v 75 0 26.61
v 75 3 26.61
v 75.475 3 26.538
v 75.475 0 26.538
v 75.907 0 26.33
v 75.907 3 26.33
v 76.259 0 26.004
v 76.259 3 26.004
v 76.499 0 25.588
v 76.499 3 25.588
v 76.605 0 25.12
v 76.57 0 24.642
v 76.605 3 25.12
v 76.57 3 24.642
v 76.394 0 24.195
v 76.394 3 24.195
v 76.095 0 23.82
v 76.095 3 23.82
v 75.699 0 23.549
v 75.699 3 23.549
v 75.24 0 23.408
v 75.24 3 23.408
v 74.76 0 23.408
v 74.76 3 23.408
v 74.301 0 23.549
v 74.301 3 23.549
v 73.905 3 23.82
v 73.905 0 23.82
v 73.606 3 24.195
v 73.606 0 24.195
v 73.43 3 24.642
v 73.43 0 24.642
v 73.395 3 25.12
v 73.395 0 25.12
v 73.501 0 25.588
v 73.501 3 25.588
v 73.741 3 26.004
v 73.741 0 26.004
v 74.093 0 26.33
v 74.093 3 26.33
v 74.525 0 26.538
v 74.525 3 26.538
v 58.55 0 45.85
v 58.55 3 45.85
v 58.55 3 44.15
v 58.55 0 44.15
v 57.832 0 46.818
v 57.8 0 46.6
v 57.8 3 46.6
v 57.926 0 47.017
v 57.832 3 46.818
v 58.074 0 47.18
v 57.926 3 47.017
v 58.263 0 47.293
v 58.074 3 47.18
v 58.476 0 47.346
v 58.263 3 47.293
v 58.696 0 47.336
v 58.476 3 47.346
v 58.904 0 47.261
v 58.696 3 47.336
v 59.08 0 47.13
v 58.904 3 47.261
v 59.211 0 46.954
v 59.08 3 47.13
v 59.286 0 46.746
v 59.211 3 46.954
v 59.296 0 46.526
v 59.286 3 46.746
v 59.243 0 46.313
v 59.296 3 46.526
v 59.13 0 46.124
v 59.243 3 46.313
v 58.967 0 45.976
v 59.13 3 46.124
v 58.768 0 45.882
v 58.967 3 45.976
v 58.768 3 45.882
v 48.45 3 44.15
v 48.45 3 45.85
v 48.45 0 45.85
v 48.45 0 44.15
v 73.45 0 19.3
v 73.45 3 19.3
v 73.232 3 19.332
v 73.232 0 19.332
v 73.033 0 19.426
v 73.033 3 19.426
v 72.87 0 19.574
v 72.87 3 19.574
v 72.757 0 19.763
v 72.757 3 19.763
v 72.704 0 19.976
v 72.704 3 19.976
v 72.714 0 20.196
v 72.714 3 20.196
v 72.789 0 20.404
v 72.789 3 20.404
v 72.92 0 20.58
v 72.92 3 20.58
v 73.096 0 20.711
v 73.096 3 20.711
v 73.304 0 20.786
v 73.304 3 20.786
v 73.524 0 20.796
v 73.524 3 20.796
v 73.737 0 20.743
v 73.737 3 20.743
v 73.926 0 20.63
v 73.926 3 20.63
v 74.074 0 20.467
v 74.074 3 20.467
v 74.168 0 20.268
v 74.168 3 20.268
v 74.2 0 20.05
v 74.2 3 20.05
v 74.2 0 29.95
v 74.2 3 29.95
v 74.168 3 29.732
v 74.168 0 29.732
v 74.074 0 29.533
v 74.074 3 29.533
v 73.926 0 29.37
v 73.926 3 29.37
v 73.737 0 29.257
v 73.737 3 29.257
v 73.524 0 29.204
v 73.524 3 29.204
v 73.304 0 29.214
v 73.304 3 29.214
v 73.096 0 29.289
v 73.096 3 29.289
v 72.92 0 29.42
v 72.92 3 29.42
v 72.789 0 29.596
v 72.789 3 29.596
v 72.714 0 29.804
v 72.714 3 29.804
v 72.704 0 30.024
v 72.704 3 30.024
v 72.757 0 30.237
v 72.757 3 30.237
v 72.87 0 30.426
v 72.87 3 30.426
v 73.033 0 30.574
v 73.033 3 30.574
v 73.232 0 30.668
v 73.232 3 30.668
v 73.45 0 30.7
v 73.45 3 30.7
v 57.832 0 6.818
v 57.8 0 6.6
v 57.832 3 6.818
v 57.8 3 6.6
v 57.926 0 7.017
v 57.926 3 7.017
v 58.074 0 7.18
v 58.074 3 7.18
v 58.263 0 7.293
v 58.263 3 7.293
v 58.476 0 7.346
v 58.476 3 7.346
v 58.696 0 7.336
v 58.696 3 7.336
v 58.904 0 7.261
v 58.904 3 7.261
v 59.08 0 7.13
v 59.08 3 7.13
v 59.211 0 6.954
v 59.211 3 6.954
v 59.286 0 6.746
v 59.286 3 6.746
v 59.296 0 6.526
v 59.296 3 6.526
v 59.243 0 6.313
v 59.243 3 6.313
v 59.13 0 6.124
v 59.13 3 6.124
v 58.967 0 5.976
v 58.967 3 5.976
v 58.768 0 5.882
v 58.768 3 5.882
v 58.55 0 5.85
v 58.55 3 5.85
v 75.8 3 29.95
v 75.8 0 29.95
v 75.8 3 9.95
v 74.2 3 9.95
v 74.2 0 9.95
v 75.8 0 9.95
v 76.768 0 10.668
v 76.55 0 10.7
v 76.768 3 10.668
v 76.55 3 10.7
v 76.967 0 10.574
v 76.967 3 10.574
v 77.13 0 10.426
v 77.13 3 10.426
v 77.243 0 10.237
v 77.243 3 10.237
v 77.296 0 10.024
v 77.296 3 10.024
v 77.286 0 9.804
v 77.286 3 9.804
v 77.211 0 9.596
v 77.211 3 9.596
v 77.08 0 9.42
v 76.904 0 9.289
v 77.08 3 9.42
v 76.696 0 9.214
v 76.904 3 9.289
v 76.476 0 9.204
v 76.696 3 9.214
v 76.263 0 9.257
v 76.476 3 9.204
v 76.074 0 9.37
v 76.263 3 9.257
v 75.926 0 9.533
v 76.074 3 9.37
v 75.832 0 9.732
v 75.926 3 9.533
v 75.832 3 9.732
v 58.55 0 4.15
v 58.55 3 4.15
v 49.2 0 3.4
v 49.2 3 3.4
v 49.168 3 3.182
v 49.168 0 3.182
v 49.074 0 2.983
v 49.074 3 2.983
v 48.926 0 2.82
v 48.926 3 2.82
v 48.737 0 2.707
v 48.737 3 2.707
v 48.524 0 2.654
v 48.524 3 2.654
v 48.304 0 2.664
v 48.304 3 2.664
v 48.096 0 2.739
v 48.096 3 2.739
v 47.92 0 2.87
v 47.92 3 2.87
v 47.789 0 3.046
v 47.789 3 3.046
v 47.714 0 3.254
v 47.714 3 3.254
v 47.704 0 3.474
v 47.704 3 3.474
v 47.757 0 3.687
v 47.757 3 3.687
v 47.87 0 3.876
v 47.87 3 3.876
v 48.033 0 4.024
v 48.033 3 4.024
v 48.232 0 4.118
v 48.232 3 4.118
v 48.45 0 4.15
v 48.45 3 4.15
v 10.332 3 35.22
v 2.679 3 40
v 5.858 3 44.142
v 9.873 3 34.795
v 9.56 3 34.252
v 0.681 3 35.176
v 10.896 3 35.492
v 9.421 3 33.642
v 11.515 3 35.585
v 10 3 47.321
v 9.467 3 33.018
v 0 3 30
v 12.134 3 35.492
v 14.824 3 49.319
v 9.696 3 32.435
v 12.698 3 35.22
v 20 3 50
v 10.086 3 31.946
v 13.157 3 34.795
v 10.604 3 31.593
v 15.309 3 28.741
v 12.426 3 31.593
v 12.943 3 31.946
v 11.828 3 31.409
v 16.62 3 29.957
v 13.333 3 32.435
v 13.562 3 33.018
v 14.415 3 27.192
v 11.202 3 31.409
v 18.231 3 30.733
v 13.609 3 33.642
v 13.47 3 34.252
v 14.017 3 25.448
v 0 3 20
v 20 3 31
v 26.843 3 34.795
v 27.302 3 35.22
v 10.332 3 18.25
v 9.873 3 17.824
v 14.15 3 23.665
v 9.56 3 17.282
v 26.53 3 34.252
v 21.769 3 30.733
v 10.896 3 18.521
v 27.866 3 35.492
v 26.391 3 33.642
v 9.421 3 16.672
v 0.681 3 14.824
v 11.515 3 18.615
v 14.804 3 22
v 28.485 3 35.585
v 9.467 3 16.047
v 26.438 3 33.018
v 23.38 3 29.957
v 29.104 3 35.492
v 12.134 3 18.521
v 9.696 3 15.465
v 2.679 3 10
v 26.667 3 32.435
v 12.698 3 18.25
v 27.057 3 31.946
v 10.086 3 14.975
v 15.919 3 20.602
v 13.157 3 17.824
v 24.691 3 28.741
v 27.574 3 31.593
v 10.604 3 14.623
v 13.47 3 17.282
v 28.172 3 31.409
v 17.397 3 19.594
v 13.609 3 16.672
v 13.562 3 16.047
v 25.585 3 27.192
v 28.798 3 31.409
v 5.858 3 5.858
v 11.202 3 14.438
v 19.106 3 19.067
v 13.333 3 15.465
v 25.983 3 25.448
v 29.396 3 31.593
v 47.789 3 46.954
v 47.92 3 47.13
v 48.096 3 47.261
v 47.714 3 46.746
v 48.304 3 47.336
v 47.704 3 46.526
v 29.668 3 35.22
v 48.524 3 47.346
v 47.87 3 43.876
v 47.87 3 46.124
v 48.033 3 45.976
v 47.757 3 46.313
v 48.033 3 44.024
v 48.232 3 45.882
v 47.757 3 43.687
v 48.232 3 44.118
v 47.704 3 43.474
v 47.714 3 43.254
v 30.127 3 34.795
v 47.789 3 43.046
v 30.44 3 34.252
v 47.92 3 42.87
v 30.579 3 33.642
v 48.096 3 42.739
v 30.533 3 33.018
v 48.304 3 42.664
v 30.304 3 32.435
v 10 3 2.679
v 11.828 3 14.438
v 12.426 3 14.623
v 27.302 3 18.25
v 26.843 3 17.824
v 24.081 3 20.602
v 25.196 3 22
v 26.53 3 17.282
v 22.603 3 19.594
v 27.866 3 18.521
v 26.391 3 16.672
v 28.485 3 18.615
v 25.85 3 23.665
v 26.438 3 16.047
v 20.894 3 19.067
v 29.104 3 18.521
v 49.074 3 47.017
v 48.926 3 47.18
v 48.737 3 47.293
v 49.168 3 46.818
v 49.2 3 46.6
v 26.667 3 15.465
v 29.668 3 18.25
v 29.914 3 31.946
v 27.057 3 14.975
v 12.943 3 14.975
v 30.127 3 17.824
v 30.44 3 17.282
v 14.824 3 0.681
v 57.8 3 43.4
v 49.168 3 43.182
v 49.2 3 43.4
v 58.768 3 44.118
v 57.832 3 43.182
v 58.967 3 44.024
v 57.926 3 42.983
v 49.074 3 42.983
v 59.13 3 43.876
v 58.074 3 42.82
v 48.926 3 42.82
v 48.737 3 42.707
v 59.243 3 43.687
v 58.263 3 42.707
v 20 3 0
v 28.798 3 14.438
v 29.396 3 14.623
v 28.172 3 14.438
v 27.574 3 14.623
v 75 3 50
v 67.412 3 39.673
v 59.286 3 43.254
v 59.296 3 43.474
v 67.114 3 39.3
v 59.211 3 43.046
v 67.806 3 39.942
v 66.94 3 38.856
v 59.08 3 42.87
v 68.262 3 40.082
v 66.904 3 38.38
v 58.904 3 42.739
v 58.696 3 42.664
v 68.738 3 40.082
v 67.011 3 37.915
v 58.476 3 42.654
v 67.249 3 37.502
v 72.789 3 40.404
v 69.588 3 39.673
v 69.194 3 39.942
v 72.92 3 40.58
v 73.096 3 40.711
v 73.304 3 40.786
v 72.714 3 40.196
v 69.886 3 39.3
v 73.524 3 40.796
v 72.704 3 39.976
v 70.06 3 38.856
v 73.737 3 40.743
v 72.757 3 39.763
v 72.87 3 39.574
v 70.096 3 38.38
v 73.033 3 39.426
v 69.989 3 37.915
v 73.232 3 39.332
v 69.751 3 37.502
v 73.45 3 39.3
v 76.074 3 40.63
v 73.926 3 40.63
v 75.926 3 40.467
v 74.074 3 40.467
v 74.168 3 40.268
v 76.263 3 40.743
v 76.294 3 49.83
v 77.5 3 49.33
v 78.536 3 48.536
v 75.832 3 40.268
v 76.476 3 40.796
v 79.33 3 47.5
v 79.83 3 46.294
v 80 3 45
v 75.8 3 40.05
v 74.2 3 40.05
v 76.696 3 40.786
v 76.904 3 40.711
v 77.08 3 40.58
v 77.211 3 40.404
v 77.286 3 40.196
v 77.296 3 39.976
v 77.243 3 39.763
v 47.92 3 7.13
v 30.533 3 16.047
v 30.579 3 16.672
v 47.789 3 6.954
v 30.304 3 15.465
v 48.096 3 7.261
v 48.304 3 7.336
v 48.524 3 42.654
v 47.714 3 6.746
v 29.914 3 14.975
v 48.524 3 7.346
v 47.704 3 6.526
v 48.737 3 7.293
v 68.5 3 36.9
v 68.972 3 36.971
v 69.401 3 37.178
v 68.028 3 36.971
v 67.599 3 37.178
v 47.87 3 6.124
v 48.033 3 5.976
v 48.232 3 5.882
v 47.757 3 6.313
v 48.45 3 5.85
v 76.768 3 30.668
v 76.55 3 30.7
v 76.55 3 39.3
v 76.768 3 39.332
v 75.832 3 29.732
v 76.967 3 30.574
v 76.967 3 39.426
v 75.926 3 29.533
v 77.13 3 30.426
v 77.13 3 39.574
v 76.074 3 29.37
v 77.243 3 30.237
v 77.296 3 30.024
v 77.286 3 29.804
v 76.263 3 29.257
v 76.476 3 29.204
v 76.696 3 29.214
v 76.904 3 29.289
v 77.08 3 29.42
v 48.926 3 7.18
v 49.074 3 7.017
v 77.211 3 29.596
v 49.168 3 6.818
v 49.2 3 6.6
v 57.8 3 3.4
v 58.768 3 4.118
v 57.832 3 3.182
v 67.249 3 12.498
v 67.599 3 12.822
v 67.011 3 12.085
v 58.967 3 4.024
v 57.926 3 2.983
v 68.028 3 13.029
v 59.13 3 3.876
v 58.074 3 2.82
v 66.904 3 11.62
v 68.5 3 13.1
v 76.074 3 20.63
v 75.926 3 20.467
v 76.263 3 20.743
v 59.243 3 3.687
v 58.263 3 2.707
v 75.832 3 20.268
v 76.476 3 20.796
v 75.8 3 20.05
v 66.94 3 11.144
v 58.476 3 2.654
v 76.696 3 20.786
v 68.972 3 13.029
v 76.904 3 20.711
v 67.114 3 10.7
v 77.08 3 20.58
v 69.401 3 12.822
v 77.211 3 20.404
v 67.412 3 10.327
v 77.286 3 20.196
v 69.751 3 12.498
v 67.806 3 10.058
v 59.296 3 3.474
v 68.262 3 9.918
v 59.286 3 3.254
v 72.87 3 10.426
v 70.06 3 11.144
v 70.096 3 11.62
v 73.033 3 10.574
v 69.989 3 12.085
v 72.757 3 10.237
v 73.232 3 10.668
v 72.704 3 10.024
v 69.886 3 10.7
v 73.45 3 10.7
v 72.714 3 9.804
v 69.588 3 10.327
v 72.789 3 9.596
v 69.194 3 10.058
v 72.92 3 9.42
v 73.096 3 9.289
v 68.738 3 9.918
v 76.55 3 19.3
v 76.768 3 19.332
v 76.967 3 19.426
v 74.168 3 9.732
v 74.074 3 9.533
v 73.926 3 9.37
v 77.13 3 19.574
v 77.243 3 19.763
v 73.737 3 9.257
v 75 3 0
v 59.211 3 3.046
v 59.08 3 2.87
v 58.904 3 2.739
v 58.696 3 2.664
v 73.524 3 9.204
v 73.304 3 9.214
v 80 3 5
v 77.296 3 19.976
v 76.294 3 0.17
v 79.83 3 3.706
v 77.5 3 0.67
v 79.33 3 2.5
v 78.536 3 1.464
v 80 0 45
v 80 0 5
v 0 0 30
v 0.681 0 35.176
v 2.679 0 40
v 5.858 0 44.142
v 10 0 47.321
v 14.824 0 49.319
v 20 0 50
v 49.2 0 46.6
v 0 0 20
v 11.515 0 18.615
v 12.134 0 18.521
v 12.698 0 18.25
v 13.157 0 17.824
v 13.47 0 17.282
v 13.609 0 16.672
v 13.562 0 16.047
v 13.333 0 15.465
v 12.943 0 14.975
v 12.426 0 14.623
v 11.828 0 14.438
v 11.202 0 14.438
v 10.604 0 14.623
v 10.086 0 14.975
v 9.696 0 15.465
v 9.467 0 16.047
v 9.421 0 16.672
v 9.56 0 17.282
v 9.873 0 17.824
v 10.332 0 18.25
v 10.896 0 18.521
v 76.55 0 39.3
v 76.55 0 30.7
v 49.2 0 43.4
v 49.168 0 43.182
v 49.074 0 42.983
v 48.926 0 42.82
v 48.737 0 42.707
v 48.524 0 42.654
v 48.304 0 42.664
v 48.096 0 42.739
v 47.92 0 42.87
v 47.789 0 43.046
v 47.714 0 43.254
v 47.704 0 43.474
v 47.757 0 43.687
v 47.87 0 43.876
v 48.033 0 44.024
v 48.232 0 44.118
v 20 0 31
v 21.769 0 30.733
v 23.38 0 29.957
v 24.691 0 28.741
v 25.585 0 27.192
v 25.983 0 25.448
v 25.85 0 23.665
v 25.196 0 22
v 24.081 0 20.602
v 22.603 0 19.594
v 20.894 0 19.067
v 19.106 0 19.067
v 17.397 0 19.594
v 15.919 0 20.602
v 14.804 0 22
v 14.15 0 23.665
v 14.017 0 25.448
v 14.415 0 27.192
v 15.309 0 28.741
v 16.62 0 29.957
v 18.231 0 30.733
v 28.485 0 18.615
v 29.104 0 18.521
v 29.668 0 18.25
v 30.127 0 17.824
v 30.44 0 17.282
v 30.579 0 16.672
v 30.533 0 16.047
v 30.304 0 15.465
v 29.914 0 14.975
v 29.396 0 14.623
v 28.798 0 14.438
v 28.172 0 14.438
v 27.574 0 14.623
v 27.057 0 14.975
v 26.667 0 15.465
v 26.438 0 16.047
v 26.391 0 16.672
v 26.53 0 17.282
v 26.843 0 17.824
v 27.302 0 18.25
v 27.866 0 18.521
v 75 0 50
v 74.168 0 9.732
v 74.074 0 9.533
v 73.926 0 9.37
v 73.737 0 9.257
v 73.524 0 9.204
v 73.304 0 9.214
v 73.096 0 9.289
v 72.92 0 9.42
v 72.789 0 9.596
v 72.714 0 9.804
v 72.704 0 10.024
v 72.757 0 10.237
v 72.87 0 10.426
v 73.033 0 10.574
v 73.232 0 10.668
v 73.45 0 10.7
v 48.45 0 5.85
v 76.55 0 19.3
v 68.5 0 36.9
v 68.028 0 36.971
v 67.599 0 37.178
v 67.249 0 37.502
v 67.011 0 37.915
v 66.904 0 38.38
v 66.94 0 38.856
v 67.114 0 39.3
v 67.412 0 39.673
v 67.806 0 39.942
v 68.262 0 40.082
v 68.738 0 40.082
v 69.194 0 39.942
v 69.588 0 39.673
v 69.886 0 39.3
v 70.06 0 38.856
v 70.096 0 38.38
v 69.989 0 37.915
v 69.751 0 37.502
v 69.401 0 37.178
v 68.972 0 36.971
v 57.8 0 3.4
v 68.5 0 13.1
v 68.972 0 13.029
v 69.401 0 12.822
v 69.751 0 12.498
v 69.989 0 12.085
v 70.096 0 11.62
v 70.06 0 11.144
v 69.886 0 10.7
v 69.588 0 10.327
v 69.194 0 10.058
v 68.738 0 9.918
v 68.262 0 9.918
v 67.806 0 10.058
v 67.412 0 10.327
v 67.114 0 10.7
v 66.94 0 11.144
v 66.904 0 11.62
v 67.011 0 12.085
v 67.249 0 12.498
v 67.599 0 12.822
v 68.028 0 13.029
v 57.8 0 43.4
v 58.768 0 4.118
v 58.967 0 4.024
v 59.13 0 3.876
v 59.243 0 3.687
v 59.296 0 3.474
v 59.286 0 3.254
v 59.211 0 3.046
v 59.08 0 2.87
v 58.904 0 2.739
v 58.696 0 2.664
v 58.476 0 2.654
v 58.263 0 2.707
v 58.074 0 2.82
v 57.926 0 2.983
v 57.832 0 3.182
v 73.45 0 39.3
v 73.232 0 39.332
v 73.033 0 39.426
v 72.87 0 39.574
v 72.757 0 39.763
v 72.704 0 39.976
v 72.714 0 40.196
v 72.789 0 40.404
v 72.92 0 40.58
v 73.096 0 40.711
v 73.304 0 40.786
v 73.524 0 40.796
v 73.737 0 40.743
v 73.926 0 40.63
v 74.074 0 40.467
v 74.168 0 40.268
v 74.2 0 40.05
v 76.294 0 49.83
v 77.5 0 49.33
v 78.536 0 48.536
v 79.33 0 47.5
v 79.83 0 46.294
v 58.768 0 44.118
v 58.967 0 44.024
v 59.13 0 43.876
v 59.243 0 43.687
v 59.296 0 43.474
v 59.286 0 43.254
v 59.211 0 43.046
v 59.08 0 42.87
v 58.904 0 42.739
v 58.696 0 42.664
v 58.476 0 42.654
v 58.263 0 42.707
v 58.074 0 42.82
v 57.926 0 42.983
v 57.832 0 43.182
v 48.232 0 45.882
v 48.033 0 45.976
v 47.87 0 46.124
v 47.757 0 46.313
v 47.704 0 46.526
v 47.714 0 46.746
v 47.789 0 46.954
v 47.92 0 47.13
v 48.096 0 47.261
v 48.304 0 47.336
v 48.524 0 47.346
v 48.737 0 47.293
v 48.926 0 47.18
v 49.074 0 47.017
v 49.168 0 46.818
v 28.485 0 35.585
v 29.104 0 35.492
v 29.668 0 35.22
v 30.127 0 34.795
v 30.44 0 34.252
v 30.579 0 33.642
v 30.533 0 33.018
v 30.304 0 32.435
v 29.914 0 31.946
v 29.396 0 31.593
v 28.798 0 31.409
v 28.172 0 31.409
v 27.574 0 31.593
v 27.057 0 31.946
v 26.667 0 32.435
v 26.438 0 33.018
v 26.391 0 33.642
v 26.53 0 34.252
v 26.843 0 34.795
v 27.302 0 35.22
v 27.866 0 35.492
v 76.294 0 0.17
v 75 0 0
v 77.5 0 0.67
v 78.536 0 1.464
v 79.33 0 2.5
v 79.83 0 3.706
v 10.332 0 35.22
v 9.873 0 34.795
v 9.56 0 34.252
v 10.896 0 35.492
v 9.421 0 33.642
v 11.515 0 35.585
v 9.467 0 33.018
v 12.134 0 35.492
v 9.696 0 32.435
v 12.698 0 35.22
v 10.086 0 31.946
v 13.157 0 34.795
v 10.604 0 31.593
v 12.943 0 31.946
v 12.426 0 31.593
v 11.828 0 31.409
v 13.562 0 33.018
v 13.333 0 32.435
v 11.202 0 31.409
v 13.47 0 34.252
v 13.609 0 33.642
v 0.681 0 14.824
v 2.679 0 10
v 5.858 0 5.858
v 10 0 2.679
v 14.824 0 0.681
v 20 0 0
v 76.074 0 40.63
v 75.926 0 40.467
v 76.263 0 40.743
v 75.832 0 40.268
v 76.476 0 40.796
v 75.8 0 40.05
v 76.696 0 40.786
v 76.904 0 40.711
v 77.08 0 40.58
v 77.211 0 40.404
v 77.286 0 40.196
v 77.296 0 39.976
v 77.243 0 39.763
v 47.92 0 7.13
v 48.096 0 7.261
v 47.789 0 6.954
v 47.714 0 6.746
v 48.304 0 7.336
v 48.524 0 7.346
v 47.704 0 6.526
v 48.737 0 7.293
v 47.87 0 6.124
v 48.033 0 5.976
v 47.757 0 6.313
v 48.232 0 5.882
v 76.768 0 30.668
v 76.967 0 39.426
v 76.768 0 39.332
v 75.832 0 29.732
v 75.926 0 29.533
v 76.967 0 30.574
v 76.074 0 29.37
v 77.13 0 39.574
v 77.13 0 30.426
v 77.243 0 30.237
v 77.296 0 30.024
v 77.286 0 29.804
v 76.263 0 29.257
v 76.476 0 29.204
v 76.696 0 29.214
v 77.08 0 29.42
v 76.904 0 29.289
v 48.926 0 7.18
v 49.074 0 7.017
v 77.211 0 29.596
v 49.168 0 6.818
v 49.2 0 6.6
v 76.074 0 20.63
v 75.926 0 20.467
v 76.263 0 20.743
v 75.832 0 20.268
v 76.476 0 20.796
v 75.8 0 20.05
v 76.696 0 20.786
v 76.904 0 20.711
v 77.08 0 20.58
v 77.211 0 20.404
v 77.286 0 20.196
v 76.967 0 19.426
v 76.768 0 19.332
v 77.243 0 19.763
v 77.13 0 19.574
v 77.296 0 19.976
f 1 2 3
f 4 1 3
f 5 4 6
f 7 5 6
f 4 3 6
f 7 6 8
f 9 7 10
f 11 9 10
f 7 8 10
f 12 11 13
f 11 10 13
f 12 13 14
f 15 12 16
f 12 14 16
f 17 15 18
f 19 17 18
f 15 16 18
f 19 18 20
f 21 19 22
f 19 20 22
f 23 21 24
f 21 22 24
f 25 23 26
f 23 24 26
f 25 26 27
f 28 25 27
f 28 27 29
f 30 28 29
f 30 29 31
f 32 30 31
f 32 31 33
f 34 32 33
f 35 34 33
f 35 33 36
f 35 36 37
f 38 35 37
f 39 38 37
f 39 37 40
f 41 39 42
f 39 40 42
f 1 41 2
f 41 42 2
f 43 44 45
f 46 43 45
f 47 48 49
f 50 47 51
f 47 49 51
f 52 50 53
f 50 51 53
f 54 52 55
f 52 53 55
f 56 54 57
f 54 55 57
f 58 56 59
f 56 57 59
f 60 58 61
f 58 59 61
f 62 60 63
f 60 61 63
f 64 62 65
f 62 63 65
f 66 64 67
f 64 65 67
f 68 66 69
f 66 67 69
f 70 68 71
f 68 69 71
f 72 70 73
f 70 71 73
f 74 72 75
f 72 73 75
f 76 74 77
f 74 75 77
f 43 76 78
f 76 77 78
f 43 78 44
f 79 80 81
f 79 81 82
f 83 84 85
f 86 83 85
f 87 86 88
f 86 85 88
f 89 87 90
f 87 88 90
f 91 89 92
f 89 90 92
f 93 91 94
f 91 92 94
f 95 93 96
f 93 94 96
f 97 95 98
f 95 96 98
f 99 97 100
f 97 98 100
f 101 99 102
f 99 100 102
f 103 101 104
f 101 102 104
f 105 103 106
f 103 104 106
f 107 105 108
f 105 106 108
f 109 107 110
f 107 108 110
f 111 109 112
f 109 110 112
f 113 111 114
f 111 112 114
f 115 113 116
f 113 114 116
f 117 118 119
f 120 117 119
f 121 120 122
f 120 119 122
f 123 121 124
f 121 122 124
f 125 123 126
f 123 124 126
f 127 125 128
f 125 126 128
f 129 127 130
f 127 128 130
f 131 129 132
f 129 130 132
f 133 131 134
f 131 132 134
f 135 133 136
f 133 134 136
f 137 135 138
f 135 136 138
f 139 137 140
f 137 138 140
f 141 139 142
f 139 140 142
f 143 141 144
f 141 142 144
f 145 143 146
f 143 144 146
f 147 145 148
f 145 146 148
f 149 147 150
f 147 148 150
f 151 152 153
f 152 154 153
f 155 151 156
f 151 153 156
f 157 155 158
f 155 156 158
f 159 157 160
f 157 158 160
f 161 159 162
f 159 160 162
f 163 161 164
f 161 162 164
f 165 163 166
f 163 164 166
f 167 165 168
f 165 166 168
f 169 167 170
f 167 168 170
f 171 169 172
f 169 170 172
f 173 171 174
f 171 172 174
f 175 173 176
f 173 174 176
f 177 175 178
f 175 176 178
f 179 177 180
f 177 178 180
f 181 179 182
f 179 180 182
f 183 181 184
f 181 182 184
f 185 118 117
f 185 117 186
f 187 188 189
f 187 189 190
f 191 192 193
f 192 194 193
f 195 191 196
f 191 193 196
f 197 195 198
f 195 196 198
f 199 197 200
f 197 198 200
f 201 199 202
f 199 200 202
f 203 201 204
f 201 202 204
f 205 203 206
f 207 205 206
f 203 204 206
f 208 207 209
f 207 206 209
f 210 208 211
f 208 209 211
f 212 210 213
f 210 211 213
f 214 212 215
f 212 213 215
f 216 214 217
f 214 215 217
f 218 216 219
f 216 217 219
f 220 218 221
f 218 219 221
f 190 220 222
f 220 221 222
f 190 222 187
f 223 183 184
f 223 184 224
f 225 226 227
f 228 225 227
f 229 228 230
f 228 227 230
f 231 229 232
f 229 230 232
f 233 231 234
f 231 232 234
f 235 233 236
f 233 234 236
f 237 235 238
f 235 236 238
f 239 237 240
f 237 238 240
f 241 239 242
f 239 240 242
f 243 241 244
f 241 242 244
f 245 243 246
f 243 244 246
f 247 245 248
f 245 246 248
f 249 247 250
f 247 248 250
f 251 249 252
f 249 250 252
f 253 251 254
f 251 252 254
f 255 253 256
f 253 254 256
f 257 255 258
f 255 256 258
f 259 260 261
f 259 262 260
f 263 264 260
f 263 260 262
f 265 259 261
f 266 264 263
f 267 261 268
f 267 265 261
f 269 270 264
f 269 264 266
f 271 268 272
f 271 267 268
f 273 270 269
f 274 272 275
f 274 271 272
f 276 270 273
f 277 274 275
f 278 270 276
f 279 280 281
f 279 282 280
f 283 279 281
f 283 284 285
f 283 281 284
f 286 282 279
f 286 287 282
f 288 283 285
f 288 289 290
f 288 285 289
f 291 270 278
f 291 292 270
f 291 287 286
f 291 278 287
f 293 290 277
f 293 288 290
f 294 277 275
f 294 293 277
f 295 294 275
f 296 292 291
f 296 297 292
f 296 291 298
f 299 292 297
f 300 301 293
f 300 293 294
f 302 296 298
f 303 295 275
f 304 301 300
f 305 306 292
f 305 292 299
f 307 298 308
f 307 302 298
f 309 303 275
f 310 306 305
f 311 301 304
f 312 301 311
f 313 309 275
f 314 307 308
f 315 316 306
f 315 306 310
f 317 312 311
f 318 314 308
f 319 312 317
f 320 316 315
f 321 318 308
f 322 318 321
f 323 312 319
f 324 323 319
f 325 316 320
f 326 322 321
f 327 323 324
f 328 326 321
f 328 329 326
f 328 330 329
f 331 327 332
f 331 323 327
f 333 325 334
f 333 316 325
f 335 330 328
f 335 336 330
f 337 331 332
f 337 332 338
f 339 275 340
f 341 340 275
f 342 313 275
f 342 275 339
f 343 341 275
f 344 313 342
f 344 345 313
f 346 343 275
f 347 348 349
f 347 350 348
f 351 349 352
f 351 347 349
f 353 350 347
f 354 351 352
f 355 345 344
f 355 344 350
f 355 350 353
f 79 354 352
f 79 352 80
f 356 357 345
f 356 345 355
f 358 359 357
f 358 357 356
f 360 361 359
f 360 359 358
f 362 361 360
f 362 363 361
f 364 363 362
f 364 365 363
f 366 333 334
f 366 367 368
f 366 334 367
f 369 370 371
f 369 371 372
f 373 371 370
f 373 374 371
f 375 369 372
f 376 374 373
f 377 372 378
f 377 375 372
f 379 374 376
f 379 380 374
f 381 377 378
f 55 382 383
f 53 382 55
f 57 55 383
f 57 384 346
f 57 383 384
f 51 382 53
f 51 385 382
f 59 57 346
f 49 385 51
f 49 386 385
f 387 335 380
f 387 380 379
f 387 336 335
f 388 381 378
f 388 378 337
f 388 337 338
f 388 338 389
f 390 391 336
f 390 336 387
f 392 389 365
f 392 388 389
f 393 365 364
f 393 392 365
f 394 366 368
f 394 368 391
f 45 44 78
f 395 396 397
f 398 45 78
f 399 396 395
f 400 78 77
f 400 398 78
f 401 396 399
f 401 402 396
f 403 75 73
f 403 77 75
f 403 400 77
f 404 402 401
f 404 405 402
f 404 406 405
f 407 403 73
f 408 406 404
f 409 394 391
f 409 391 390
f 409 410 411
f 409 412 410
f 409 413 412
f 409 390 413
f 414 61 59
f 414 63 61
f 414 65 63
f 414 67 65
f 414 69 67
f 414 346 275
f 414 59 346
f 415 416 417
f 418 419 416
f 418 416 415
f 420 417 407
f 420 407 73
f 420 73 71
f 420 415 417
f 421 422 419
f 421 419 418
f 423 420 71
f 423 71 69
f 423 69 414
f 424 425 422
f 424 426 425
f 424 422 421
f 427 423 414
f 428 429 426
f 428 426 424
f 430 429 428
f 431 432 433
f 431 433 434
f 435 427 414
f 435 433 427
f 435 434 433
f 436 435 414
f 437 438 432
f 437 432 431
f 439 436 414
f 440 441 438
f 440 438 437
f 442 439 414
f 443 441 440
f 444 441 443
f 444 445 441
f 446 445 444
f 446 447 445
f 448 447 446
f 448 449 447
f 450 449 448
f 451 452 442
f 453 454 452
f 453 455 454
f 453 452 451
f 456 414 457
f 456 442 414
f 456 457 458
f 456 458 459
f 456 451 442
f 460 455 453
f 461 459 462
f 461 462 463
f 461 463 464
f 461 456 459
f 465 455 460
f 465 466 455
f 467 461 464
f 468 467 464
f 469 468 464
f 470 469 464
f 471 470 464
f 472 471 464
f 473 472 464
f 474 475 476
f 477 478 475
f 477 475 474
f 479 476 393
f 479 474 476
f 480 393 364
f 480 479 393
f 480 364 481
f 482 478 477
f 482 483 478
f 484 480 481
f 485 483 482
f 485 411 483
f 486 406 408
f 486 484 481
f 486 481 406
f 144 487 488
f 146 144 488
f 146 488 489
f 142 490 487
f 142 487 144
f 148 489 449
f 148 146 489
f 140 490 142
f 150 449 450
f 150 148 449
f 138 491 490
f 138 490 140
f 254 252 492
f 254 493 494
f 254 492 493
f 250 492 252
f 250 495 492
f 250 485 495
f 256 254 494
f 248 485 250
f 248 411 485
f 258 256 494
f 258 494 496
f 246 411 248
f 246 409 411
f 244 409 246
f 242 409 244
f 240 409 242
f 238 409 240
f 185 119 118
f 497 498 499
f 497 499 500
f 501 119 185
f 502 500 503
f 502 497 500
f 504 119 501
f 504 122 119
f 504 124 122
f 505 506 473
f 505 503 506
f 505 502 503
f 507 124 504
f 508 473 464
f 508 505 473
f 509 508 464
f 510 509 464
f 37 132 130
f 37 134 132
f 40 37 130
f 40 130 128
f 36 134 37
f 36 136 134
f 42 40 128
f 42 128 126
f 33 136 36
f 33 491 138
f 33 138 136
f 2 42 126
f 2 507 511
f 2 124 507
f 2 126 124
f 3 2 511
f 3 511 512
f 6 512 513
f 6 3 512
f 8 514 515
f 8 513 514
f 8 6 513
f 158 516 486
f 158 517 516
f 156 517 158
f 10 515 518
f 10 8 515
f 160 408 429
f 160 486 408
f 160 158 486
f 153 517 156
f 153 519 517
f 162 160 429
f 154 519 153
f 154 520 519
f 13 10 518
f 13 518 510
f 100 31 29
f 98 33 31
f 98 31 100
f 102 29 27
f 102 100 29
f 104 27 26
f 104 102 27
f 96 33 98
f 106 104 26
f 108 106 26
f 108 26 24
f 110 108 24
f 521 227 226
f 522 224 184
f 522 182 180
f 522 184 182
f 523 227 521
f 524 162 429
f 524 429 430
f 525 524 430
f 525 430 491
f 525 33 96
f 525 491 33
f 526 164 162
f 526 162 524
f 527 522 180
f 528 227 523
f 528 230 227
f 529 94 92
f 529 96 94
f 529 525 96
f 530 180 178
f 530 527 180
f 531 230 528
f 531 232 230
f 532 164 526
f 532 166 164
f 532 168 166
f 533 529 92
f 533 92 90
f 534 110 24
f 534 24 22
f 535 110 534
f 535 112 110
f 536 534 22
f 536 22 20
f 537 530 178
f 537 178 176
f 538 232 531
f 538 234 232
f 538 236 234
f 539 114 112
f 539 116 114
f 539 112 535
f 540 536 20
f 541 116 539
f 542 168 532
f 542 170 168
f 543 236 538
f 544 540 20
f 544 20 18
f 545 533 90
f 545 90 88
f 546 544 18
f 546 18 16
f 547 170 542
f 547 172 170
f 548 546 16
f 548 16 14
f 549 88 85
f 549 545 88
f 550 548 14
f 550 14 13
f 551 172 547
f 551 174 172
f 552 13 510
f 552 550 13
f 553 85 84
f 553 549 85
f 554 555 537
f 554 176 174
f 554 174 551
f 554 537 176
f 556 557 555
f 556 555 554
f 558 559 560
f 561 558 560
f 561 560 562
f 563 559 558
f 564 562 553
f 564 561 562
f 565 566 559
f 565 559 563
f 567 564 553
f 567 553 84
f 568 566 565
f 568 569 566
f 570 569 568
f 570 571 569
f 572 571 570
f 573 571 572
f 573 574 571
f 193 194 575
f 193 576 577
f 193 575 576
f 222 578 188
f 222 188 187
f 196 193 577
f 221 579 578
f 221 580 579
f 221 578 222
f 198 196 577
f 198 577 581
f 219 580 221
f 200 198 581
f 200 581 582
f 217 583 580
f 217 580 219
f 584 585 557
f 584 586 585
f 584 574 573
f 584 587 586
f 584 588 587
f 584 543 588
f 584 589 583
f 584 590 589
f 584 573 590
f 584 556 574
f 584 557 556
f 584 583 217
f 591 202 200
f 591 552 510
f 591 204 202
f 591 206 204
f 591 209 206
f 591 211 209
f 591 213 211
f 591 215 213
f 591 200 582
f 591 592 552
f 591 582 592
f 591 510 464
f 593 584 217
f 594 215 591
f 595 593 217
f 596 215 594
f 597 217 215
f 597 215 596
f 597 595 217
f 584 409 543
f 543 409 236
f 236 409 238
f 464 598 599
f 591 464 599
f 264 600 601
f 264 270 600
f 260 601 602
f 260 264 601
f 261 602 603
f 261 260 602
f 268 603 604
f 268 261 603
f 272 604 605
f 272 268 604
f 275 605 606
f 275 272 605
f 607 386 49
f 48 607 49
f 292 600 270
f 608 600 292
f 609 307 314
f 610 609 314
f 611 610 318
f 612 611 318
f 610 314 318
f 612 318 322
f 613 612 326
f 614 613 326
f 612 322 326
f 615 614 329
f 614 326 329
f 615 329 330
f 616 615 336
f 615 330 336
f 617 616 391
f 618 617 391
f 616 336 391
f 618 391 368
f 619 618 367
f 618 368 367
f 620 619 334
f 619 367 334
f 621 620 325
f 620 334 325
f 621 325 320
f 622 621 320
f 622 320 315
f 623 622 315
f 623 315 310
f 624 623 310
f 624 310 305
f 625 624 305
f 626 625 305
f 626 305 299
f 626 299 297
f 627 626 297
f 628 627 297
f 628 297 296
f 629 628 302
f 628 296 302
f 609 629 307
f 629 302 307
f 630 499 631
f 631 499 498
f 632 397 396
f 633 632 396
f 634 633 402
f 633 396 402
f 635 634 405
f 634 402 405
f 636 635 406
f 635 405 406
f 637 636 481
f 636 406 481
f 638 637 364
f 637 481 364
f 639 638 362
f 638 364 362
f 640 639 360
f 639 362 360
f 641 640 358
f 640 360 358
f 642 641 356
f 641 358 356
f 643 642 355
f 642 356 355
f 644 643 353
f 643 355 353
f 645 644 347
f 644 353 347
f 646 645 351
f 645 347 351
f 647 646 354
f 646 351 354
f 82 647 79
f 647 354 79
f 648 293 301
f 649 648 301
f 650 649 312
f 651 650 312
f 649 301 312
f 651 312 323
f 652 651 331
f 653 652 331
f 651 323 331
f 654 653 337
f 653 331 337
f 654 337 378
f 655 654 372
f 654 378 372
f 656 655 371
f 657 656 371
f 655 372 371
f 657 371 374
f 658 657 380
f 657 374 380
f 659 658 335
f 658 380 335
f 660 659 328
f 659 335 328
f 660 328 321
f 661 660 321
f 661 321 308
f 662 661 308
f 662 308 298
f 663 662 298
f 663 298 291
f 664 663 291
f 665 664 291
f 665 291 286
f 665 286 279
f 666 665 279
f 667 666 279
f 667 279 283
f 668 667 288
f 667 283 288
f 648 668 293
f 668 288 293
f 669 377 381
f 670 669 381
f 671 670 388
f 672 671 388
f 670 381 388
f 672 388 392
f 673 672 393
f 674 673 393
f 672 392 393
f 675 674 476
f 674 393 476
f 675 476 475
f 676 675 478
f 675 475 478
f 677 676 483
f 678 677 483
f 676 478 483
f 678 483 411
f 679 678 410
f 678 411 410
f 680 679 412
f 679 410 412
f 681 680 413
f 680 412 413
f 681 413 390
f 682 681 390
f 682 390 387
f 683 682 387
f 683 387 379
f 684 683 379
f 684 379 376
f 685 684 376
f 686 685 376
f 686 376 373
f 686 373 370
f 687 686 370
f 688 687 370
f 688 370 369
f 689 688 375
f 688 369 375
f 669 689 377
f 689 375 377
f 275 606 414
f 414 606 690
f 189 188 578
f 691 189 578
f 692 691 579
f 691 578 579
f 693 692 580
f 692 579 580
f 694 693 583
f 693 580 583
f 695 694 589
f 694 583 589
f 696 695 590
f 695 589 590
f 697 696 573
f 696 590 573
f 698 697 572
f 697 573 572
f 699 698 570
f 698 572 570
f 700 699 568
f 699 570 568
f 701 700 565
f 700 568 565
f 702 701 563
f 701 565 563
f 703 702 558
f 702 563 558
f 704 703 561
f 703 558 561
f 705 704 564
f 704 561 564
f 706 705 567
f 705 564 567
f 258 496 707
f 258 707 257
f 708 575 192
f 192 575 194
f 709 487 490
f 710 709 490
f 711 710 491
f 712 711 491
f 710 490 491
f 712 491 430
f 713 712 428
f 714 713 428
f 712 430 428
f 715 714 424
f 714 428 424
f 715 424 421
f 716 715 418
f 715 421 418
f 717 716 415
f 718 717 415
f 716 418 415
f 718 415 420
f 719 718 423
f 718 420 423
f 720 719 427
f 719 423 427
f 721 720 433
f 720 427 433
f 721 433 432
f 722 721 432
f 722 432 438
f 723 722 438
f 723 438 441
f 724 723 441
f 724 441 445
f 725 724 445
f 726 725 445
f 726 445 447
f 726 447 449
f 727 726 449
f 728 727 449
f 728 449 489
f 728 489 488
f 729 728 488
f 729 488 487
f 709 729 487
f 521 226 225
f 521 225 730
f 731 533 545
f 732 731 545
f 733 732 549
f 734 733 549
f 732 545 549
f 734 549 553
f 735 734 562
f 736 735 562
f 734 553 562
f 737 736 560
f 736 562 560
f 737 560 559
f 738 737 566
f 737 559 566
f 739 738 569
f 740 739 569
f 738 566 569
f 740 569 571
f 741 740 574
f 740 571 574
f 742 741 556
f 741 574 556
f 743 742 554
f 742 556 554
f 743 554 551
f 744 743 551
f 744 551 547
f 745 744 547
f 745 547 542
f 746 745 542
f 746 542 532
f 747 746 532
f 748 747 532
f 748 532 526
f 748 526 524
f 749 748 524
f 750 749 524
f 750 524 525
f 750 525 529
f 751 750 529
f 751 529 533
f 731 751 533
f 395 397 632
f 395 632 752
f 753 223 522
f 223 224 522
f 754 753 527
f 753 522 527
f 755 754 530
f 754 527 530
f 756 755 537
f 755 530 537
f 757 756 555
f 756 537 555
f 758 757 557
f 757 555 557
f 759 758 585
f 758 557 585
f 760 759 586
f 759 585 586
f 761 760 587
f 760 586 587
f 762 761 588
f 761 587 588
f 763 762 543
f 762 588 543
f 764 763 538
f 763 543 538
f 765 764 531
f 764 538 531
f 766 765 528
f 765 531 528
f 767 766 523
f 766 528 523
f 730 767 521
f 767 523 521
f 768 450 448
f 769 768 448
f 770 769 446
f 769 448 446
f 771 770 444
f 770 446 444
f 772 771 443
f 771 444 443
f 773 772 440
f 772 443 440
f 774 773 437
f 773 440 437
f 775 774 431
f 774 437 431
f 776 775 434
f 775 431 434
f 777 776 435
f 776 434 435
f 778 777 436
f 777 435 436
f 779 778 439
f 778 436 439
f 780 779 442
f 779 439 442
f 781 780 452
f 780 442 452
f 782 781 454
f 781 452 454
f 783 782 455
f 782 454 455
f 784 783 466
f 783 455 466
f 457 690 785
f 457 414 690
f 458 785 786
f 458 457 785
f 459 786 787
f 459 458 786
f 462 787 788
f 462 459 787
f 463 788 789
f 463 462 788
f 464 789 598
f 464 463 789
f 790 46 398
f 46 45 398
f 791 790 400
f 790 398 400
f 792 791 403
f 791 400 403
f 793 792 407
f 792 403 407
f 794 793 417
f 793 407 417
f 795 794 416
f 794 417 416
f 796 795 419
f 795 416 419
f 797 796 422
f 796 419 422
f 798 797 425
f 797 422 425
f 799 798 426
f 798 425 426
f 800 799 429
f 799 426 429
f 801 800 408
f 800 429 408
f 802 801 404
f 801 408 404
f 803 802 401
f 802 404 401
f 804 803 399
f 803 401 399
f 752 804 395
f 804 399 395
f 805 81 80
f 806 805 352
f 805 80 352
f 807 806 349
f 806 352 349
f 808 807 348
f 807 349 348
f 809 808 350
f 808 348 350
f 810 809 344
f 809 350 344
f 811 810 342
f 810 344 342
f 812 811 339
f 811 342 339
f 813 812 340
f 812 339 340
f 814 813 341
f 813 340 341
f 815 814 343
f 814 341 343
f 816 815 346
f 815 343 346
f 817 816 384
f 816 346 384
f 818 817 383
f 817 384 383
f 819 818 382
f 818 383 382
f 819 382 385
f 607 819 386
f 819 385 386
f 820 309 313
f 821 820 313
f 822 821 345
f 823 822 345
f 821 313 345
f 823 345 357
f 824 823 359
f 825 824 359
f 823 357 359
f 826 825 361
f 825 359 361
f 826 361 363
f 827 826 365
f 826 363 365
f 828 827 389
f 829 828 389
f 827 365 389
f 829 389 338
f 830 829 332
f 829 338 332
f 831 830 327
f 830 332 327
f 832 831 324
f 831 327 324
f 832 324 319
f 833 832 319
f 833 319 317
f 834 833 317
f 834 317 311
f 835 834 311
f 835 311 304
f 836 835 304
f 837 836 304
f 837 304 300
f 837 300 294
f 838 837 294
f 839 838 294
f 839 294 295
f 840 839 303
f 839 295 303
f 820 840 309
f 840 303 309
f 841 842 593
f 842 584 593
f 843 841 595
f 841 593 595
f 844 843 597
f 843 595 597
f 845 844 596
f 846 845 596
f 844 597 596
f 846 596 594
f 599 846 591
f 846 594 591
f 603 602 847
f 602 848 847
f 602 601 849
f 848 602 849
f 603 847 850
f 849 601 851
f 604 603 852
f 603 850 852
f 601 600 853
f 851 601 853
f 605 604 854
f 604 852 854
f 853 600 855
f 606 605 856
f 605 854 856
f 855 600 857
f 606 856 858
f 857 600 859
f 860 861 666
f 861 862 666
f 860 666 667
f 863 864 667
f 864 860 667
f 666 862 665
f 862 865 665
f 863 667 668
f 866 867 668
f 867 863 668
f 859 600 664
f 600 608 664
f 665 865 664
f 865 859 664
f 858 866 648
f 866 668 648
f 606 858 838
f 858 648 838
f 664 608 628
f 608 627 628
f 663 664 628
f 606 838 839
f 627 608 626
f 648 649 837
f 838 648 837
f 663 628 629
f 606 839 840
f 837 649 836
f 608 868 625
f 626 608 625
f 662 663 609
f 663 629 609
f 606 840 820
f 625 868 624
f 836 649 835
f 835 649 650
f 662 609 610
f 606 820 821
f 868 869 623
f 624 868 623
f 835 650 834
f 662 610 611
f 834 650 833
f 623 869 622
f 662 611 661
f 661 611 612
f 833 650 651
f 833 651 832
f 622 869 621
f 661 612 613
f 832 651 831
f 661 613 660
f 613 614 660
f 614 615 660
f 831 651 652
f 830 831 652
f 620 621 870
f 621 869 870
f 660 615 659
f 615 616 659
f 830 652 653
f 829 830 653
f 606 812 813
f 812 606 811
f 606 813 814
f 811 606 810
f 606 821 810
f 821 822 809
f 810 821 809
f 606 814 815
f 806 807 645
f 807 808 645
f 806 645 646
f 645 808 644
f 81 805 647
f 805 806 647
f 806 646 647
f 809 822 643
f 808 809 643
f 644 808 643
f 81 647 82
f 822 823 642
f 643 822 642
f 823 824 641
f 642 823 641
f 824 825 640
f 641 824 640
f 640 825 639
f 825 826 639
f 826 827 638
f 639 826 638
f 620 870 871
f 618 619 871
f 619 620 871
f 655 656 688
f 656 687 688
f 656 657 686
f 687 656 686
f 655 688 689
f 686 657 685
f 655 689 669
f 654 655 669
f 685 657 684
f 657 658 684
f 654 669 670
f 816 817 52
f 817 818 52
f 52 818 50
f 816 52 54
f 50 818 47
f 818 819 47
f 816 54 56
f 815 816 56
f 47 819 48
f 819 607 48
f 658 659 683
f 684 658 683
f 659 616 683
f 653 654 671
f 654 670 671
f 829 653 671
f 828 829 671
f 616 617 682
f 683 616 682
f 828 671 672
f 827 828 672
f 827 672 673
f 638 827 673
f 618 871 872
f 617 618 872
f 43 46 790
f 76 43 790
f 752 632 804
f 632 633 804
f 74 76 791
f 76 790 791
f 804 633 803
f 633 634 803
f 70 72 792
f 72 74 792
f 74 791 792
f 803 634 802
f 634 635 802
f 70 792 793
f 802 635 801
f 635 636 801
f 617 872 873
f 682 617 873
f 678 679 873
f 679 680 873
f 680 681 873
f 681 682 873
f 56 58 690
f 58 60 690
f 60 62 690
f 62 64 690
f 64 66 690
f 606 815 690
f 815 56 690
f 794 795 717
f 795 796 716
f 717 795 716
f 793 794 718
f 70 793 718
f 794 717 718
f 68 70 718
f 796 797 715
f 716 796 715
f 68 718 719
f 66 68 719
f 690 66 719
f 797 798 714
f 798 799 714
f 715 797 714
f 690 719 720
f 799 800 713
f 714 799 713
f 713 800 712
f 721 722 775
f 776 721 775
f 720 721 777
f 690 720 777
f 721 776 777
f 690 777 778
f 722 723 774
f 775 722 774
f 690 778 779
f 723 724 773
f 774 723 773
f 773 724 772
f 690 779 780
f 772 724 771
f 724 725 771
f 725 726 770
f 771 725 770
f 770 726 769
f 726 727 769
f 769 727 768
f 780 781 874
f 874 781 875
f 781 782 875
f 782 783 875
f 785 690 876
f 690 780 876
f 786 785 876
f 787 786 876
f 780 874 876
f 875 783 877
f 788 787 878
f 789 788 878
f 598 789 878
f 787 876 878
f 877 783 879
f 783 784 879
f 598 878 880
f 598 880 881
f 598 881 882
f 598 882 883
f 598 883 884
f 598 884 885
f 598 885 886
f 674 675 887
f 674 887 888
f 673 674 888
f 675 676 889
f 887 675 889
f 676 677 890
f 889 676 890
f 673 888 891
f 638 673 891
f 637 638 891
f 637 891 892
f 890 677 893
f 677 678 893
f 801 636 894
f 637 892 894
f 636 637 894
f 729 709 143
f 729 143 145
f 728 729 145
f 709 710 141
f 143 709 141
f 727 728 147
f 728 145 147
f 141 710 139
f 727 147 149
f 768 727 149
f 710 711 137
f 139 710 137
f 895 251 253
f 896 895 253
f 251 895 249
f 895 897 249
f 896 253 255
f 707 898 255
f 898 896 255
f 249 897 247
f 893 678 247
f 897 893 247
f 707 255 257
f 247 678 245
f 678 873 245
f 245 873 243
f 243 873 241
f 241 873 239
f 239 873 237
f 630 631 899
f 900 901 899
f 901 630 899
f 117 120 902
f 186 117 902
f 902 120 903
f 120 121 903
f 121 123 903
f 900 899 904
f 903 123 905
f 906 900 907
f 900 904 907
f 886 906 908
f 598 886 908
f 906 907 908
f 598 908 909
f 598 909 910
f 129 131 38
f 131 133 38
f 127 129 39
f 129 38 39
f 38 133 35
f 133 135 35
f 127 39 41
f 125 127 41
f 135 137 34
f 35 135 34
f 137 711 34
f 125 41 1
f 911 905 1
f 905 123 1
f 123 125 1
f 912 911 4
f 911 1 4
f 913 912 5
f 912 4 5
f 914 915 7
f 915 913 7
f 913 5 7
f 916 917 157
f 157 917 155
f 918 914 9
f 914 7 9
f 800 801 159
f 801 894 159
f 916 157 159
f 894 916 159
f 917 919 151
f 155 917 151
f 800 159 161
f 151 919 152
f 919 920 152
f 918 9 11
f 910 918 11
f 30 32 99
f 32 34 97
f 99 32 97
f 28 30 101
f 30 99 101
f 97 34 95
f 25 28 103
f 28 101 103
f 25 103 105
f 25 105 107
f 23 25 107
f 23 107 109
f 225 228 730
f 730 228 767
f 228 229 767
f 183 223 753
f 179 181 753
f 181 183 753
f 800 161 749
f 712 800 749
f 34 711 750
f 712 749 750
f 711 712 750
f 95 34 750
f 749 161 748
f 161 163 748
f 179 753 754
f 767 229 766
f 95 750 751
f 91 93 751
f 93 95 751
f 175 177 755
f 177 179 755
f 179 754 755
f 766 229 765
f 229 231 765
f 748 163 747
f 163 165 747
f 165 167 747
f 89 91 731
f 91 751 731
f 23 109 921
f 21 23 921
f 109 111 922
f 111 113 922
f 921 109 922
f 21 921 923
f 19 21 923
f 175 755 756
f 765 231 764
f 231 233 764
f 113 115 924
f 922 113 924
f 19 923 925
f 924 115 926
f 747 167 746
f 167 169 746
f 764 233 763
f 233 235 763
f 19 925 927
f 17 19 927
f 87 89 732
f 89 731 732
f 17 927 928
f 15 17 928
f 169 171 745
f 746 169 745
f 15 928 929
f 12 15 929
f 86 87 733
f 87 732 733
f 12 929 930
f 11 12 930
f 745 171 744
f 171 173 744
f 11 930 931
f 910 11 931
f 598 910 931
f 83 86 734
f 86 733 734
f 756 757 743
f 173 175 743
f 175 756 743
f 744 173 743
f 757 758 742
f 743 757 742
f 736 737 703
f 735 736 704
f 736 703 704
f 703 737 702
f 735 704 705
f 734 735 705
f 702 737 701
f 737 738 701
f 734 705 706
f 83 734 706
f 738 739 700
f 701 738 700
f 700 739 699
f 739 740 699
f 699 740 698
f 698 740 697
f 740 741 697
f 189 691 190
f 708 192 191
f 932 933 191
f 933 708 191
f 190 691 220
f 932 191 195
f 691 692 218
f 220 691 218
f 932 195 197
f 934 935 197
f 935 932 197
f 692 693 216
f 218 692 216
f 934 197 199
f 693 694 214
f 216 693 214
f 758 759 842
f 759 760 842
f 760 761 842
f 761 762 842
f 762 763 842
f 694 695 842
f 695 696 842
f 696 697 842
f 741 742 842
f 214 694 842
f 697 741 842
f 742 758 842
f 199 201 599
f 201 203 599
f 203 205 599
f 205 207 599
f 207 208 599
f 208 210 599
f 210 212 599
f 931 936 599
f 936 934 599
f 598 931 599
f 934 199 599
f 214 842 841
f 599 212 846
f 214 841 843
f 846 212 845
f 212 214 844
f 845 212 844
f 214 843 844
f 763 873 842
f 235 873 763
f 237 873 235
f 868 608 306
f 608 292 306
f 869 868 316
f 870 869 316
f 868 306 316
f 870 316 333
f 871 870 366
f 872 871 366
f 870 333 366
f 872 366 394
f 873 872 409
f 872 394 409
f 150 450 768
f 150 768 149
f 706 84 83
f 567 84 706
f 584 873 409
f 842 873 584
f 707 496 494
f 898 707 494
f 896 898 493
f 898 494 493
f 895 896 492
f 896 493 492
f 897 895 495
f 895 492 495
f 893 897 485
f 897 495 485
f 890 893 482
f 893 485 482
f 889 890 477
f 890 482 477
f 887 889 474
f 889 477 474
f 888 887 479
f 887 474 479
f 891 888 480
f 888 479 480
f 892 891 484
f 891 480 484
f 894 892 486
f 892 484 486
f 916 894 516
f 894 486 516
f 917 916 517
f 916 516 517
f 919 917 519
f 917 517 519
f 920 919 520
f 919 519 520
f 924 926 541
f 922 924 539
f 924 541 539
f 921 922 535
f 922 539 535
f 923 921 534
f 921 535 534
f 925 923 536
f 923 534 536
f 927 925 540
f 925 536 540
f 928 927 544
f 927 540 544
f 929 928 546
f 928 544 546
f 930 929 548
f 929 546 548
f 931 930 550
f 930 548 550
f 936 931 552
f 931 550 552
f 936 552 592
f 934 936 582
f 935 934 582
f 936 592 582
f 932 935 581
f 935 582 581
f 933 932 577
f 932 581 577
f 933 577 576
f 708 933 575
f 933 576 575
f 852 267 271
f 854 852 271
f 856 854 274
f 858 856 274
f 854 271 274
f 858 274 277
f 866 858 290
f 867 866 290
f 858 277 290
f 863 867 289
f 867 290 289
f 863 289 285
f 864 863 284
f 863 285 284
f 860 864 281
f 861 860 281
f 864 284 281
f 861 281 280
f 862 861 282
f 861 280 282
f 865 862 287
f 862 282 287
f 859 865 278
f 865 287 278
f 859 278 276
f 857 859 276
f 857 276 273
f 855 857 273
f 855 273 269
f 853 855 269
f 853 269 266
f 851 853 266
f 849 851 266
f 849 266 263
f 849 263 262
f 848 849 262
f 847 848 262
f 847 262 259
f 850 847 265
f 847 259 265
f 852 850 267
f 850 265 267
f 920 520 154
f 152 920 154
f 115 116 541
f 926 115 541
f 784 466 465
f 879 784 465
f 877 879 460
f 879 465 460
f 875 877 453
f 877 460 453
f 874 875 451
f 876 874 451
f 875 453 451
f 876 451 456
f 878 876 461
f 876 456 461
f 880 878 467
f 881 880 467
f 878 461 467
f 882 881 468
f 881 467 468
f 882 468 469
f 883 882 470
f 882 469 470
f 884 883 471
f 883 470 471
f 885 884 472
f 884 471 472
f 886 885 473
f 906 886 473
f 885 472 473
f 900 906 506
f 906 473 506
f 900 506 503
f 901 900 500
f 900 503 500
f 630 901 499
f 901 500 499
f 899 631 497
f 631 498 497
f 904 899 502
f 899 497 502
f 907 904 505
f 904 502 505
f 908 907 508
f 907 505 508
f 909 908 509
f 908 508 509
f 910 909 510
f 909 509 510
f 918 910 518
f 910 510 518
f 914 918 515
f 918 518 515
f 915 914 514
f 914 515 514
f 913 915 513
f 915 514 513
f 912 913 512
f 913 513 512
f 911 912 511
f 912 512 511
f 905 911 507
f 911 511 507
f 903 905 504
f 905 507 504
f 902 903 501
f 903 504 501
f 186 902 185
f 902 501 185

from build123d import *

# Parameters (mm, degrees)
SKETCH_1_W          = 80
SKETCH_1_H          = 50
EXTRUDE_1_DEPTH     = 3
SKETCH_2_R          = 6
SKETCH_2_R_2        = 2.1
CUT_EXTRUDE_1_DEPTH = 3
SKETCH_3_R          = 1.61
SKETCH_3_W          = 3.1
SKETCH_3_H          = 10.1
CUT_EXTRUDE_2_DEPTH = 3
SKETCH_4_R          = 1.6
SKETCH_4_W          = 10.1
SKETCH_4_H          = 3.2
CUT_EXTRUDE_3_DEPTH = 95.387499172
FILLET_1_R          = 20
FILLET_2_R          = 5
SKETCH_5_R          = 0.75
CUT_EXTRUDE_4_DEPTH = 95.387499172


with BuildPart() as part:
    # 草图1 → 凸台-拉伸1 (new body)
    with BuildSketch(Plane(origin=(0, 0, 0), x_dir=(1, 0, 0), z_dir=(0, 1, 0))):
        with Locations((40, -25)):
            Rectangle(SKETCH_1_W, SKETCH_1_H)
    extrude(amount=EXTRUDE_1_DEPTH)

    # 草图2 → 切除-拉伸1 (cut)
    with BuildSketch(Plane(origin=(0, 3, 0), x_dir=(1, 0, 0), z_dir=(0, 1, 0))):
        with Locations(Location((20, -25, 0), (0, 0, 270))):
            Circle(SKETCH_2_R)
        with Locations(Location((11.514718626, -16.514718626, 0), (0, 0, 270))):
            Circle(SKETCH_2_R_2)
        with Locations(Location((28.485281374, -16.514718626, 0), (0, 0, 270))):
            Circle(SKETCH_2_R_2)
        with Locations(Location((28.485281374, -33.485281374, 0), (0, 0, 270))):
            Circle(SKETCH_2_R_2)
        with Locations(Location((11.514718626, -33.485281374, 0), (0, 0, 270))):
            Circle(SKETCH_2_R_2)
    extrude(amount=-CUT_EXTRUDE_1_DEPTH, mode=Mode.SUBTRACT)

    # 草图3 → 切除-拉伸2 (cut)
    with BuildSketch(Plane(origin=(0, 3, 0), x_dir=(1, 0, 0), z_dir=(0, 1, 0))):
        with Locations(Location((75, -25, 0), (0, 0, 270))):
            Circle(SKETCH_3_R)
        with Locations((75, -15)):
            Rectangle(SKETCH_3_W, SKETCH_3_H)
        with Locations((75, -35)):
            Rectangle(SKETCH_3_W, SKETCH_3_H)
    extrude(amount=-CUT_EXTRUDE_2_DEPTH, mode=Mode.SUBTRACT)

    # 草图4 → 切除-拉伸3 (cut, through all)
    with BuildSketch(Plane(origin=(0, 3, 0), x_dir=(1, 0, 0), z_dir=(0, 1, 0))):
        with Locations(Location((68.5, -11.5, 0), (0, 0, 270))):
            Circle(SKETCH_4_R)
        with Locations(Location((68.5, -38.5, 0), (0, 0, 90))):
            Circle(SKETCH_4_R)
        with Locations((53.5, -5)):
            Rectangle(SKETCH_4_W, SKETCH_4_H)
        with Locations((53.5, -45)):
            Rectangle(SKETCH_4_W, SKETCH_4_H)
    extrude(amount=-CUT_EXTRUDE_3_DEPTH, mode=Mode.SUBTRACT)

    # 圆角1
    fillet_1_edges = [part.edges().sort_by_distance(p)[0] for p in [
        (0, 1.5, 0),
        (0, 1.5, 50),
    ]]
    fillet(fillet_1_edges, radius=FILLET_1_R)

    # 圆角2
    fillet_2_edges = [part.edges().sort_by_distance(p)[0] for p in [
        (80, 1.5, 0),
        (80, 1.5, 50),
    ]]
    fillet(fillet_2_edges, radius=FILLET_2_R)

    # 草图5 → 切除-拉伸4 (cut, through all)
    with BuildSketch(Plane(origin=(0, 3, 0), x_dir=(1, 0, 0), z_dir=(0, 1, 0))):
        with Locations((48.45, -3.4)):
            Circle(SKETCH_5_R)
        with Locations((48.45, -6.6)):
            Circle(SKETCH_5_R)
        with Locations((58.55, -6.6)):
            Circle(SKETCH_5_R)
        with Locations((58.55, -3.4)):
            Circle(SKETCH_5_R)
        with Locations((73.45, -9.95)):
            Circle(SKETCH_5_R)
        with Locations((76.55, -9.95)):
            Circle(SKETCH_5_R)
        with Locations((76.55, -20.05)):
            Circle(SKETCH_5_R)
        with Locations((73.45, -20.05)):
            Circle(SKETCH_5_R)
        with Locations((73.45, -29.95)):
            Circle(SKETCH_5_R)
        with Locations((76.55, -29.95)):
            Circle(SKETCH_5_R)
        with Locations((76.55, -40.05)):
            Circle(SKETCH_5_R)
        with Locations((73.45, -40.05)):
            Circle(SKETCH_5_R)
        with Locations((58.55, -46.6)):
            Circle(SKETCH_5_R)
        with Locations((58.55, -43.4)):
            Circle(SKETCH_5_R)
        with Locations((48.45, -43.4)):
            Circle(SKETCH_5_R)
        with Locations((48.45, -46.6)):
            Circle(SKETCH_5_R)
    extrude(amount=-CUT_EXTRUDE_4_DEPTH, mode=Mode.SUBTRACT)


solid = part.part
